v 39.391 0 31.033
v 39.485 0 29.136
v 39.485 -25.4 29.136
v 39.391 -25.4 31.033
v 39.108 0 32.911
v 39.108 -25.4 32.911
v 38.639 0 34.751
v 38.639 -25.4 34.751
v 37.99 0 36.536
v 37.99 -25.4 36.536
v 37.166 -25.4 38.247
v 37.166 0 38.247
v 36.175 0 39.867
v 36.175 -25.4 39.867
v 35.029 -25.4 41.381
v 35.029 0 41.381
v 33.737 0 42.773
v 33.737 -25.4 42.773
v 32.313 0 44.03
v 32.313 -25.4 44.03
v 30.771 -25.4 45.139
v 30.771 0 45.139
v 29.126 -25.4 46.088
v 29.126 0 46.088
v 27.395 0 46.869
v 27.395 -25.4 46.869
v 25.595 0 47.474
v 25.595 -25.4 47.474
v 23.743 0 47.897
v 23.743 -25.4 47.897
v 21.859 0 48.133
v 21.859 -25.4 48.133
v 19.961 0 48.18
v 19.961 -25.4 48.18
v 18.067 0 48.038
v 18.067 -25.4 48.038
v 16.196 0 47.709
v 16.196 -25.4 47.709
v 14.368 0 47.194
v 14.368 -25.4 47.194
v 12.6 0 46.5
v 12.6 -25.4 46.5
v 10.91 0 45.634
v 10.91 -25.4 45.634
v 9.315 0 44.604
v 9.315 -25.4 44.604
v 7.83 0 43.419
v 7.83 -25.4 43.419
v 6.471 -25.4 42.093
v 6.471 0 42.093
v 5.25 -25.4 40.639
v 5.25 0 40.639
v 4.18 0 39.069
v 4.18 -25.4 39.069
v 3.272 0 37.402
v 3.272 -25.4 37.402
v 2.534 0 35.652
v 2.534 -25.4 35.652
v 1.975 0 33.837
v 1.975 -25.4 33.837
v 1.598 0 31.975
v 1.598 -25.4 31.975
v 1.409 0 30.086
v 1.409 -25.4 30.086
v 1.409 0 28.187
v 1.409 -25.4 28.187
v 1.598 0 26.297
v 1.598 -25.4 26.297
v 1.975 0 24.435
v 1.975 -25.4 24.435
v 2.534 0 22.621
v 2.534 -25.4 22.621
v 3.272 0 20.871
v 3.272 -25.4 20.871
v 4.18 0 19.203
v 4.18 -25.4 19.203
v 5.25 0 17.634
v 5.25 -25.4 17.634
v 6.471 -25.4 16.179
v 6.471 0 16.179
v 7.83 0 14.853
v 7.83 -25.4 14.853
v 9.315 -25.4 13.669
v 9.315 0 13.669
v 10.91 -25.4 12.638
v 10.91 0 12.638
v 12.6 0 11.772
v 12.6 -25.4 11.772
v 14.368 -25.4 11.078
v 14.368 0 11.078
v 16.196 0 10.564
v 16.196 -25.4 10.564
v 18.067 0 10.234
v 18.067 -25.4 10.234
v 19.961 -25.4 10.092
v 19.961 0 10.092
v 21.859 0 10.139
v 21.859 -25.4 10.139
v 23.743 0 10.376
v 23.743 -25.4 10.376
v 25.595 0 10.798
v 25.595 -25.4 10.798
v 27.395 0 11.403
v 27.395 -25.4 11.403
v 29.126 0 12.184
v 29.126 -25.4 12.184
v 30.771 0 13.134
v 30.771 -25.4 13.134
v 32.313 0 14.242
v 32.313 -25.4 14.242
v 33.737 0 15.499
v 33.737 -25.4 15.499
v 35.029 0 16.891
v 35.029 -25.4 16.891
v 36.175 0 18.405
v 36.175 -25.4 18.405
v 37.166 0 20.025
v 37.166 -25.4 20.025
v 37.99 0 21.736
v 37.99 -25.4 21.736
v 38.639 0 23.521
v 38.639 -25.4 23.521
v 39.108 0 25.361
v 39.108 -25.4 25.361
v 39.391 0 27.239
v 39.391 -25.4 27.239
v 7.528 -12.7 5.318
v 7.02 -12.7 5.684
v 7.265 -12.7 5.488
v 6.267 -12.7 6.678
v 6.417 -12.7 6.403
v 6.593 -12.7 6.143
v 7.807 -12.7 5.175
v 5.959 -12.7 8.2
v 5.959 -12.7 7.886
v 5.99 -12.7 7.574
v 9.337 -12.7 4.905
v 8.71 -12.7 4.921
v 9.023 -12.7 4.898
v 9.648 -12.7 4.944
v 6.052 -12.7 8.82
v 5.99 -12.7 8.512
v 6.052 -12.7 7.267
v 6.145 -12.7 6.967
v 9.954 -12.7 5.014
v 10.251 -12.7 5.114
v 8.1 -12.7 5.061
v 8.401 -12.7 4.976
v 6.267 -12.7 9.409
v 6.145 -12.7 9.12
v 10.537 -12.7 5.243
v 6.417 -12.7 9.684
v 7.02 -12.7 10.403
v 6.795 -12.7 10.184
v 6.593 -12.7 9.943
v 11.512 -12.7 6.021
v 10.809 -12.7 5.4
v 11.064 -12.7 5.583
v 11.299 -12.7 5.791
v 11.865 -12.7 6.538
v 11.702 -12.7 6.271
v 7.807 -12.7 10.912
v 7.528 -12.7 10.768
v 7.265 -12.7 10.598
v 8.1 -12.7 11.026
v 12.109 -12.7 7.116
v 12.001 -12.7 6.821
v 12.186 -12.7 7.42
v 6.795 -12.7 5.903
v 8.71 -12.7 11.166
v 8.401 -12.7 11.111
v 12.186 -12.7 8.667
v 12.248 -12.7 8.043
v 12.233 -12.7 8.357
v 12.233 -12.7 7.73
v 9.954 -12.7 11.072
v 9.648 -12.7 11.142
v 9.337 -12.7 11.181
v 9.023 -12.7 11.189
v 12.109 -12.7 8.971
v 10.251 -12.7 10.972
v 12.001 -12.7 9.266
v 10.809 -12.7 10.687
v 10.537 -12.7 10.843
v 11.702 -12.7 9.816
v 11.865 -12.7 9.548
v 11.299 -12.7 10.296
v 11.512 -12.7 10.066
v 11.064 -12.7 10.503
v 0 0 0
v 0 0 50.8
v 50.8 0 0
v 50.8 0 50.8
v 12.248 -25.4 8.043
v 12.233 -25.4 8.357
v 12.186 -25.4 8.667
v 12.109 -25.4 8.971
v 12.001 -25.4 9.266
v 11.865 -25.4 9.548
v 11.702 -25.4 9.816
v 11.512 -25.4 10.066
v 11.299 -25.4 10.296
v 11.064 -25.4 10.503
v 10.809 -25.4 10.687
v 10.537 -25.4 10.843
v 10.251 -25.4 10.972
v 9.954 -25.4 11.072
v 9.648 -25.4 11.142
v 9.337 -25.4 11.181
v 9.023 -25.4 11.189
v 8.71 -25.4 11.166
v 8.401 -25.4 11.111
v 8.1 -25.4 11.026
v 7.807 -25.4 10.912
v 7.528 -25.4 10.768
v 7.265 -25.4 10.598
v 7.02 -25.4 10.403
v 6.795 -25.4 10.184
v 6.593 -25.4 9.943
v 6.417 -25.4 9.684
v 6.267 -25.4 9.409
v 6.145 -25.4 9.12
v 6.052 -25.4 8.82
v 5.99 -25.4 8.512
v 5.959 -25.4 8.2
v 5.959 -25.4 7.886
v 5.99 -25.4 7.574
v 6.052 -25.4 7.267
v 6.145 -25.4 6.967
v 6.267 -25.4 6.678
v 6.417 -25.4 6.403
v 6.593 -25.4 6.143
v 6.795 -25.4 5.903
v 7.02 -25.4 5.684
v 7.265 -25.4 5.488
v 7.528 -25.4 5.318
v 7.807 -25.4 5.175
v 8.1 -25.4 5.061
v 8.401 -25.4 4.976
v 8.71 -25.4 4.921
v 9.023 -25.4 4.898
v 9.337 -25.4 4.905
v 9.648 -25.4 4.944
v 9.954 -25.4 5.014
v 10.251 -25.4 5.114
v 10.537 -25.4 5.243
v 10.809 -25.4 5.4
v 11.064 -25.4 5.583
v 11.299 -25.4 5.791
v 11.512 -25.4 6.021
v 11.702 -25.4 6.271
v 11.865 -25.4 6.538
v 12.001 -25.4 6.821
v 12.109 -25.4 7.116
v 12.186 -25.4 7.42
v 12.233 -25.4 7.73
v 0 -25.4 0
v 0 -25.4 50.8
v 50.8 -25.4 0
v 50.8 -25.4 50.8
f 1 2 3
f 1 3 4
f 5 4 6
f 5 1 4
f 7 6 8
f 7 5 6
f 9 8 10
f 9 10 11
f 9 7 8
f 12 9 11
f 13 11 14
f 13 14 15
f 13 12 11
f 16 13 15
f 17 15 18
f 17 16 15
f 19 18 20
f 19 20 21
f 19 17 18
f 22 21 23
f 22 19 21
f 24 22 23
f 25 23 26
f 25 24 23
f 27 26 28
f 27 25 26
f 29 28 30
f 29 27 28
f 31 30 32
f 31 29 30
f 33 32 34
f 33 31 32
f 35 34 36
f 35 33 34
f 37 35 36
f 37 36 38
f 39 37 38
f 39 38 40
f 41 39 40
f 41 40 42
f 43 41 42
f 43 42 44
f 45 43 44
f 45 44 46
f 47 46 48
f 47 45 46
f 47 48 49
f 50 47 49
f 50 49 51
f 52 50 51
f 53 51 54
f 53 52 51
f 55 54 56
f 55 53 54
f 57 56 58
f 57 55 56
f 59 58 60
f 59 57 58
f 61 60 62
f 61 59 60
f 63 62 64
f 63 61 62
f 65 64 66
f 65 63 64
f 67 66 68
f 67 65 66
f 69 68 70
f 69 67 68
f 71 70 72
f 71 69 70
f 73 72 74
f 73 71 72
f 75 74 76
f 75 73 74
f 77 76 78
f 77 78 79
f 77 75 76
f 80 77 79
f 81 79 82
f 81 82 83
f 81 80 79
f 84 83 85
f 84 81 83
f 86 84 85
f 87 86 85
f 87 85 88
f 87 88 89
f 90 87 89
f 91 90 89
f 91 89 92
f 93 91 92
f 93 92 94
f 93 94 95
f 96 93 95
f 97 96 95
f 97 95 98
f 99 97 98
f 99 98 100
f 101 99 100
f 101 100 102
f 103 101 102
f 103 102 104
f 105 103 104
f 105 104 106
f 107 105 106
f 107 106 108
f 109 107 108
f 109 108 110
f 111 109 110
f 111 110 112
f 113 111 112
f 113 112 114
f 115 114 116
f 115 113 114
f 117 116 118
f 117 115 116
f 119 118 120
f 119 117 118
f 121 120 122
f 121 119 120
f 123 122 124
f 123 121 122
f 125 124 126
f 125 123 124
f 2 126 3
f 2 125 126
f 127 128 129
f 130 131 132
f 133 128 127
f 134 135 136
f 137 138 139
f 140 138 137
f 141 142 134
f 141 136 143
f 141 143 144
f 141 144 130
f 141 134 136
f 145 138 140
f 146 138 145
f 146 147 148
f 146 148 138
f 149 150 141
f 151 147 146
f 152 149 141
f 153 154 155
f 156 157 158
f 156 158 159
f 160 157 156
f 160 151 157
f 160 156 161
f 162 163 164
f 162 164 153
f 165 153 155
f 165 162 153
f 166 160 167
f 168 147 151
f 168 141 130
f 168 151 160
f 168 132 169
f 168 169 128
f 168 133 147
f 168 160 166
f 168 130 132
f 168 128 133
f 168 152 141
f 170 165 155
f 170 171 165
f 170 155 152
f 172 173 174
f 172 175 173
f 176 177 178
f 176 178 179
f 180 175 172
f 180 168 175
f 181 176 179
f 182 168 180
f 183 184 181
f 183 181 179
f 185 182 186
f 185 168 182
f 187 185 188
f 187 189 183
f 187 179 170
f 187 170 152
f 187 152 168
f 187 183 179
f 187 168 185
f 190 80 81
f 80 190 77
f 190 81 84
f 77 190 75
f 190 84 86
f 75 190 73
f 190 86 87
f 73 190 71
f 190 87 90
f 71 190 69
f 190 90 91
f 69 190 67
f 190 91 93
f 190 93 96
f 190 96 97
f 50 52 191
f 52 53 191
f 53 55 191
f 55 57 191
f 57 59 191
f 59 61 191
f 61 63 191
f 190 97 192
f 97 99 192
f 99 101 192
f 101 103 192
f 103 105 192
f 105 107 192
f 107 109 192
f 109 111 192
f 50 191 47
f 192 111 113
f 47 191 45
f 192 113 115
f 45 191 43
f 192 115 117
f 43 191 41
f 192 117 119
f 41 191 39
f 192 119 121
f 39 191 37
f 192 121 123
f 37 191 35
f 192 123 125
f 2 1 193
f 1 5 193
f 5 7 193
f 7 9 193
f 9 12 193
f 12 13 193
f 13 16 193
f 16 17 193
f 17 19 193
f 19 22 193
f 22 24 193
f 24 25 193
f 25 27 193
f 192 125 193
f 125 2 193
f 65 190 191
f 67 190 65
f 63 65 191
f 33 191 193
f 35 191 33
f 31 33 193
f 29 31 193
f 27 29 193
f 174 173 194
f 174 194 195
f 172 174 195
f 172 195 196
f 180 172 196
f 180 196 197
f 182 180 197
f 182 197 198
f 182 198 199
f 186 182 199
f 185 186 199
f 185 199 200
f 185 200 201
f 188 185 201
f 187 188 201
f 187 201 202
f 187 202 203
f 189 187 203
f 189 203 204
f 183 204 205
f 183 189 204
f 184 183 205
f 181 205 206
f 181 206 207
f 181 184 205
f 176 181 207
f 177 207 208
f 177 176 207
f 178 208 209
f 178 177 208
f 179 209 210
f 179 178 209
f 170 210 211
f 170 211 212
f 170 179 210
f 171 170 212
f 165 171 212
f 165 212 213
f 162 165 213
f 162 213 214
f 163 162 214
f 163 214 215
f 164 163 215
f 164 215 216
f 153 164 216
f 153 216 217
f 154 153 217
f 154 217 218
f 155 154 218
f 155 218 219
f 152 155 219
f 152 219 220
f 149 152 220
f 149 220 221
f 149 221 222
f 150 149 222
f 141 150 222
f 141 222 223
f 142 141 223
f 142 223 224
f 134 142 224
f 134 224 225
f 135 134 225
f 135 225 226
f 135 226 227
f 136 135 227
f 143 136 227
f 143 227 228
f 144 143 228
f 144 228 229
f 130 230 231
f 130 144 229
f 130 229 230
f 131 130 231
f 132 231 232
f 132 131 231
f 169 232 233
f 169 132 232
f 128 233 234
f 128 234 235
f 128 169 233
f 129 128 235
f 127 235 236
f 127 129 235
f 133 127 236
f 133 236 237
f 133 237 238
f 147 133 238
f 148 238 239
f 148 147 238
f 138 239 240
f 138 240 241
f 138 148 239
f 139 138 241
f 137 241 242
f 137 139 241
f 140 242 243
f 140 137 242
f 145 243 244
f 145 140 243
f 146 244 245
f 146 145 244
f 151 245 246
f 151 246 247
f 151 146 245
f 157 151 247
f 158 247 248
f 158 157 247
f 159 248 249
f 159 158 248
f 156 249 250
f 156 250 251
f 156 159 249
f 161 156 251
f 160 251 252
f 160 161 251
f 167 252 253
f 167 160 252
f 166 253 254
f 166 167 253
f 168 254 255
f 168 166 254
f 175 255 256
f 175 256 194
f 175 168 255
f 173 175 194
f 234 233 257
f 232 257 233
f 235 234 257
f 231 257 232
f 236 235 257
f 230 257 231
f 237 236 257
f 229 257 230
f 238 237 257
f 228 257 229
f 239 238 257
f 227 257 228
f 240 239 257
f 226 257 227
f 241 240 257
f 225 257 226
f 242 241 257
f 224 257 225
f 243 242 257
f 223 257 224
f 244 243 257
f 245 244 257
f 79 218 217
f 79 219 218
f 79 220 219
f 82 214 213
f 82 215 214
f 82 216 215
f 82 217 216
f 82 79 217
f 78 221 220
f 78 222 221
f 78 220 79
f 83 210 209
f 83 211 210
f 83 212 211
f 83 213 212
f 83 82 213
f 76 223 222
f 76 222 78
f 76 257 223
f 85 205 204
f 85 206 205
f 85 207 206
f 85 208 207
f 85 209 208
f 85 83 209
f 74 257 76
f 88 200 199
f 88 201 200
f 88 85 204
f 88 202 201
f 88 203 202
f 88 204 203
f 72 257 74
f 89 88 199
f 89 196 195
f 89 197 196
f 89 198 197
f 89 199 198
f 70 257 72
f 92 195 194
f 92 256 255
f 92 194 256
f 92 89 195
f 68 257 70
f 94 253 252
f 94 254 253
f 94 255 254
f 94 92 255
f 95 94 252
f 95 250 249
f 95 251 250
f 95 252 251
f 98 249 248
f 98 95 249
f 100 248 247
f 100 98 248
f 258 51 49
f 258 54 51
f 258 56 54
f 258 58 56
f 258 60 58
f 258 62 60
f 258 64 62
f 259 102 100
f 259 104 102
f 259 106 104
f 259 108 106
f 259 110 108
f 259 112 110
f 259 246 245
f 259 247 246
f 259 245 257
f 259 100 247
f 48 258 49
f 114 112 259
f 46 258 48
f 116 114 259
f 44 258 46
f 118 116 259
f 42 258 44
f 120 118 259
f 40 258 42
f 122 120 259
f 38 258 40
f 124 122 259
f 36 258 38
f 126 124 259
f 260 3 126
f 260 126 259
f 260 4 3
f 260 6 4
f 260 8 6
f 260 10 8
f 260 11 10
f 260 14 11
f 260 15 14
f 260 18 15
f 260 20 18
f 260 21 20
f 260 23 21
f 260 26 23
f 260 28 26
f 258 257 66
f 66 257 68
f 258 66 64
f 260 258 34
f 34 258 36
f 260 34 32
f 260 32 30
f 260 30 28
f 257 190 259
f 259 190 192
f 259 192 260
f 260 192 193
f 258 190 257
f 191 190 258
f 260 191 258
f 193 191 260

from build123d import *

# Parameters (mm, degrees)
F0_W     = 50.8
F0_H     = 50.8
F0_R     = 3.146652
F0_R_2   = 19.05
F1_DEPTH = 25.4
F2_DEPTH = 12.7


with BuildPart() as f1:
    # F0 (on Front) → F1 (new body)
    with BuildSketch(Plane.XZ):
        with Locations((25.4, 25.4)):
            Rectangle(F0_W, F0_H)
        with Locations((9.101667, 8.043333)):
            Circle(F0_R, mode=Mode.SUBTRACT)
        with Locations((20.43549, 29.136131)):
            Circle(F0_R_2, mode=Mode.SUBTRACT)
    extrude(amount=F1_DEPTH)

    # F0 (on Front) → F2 (join)
    with BuildSketch(Plane.XZ):
        with Locations((9.101667, 8.043333)):
            Circle(F0_R)
    extrude(amount=F2_DEPTH)


solid = f1.part
